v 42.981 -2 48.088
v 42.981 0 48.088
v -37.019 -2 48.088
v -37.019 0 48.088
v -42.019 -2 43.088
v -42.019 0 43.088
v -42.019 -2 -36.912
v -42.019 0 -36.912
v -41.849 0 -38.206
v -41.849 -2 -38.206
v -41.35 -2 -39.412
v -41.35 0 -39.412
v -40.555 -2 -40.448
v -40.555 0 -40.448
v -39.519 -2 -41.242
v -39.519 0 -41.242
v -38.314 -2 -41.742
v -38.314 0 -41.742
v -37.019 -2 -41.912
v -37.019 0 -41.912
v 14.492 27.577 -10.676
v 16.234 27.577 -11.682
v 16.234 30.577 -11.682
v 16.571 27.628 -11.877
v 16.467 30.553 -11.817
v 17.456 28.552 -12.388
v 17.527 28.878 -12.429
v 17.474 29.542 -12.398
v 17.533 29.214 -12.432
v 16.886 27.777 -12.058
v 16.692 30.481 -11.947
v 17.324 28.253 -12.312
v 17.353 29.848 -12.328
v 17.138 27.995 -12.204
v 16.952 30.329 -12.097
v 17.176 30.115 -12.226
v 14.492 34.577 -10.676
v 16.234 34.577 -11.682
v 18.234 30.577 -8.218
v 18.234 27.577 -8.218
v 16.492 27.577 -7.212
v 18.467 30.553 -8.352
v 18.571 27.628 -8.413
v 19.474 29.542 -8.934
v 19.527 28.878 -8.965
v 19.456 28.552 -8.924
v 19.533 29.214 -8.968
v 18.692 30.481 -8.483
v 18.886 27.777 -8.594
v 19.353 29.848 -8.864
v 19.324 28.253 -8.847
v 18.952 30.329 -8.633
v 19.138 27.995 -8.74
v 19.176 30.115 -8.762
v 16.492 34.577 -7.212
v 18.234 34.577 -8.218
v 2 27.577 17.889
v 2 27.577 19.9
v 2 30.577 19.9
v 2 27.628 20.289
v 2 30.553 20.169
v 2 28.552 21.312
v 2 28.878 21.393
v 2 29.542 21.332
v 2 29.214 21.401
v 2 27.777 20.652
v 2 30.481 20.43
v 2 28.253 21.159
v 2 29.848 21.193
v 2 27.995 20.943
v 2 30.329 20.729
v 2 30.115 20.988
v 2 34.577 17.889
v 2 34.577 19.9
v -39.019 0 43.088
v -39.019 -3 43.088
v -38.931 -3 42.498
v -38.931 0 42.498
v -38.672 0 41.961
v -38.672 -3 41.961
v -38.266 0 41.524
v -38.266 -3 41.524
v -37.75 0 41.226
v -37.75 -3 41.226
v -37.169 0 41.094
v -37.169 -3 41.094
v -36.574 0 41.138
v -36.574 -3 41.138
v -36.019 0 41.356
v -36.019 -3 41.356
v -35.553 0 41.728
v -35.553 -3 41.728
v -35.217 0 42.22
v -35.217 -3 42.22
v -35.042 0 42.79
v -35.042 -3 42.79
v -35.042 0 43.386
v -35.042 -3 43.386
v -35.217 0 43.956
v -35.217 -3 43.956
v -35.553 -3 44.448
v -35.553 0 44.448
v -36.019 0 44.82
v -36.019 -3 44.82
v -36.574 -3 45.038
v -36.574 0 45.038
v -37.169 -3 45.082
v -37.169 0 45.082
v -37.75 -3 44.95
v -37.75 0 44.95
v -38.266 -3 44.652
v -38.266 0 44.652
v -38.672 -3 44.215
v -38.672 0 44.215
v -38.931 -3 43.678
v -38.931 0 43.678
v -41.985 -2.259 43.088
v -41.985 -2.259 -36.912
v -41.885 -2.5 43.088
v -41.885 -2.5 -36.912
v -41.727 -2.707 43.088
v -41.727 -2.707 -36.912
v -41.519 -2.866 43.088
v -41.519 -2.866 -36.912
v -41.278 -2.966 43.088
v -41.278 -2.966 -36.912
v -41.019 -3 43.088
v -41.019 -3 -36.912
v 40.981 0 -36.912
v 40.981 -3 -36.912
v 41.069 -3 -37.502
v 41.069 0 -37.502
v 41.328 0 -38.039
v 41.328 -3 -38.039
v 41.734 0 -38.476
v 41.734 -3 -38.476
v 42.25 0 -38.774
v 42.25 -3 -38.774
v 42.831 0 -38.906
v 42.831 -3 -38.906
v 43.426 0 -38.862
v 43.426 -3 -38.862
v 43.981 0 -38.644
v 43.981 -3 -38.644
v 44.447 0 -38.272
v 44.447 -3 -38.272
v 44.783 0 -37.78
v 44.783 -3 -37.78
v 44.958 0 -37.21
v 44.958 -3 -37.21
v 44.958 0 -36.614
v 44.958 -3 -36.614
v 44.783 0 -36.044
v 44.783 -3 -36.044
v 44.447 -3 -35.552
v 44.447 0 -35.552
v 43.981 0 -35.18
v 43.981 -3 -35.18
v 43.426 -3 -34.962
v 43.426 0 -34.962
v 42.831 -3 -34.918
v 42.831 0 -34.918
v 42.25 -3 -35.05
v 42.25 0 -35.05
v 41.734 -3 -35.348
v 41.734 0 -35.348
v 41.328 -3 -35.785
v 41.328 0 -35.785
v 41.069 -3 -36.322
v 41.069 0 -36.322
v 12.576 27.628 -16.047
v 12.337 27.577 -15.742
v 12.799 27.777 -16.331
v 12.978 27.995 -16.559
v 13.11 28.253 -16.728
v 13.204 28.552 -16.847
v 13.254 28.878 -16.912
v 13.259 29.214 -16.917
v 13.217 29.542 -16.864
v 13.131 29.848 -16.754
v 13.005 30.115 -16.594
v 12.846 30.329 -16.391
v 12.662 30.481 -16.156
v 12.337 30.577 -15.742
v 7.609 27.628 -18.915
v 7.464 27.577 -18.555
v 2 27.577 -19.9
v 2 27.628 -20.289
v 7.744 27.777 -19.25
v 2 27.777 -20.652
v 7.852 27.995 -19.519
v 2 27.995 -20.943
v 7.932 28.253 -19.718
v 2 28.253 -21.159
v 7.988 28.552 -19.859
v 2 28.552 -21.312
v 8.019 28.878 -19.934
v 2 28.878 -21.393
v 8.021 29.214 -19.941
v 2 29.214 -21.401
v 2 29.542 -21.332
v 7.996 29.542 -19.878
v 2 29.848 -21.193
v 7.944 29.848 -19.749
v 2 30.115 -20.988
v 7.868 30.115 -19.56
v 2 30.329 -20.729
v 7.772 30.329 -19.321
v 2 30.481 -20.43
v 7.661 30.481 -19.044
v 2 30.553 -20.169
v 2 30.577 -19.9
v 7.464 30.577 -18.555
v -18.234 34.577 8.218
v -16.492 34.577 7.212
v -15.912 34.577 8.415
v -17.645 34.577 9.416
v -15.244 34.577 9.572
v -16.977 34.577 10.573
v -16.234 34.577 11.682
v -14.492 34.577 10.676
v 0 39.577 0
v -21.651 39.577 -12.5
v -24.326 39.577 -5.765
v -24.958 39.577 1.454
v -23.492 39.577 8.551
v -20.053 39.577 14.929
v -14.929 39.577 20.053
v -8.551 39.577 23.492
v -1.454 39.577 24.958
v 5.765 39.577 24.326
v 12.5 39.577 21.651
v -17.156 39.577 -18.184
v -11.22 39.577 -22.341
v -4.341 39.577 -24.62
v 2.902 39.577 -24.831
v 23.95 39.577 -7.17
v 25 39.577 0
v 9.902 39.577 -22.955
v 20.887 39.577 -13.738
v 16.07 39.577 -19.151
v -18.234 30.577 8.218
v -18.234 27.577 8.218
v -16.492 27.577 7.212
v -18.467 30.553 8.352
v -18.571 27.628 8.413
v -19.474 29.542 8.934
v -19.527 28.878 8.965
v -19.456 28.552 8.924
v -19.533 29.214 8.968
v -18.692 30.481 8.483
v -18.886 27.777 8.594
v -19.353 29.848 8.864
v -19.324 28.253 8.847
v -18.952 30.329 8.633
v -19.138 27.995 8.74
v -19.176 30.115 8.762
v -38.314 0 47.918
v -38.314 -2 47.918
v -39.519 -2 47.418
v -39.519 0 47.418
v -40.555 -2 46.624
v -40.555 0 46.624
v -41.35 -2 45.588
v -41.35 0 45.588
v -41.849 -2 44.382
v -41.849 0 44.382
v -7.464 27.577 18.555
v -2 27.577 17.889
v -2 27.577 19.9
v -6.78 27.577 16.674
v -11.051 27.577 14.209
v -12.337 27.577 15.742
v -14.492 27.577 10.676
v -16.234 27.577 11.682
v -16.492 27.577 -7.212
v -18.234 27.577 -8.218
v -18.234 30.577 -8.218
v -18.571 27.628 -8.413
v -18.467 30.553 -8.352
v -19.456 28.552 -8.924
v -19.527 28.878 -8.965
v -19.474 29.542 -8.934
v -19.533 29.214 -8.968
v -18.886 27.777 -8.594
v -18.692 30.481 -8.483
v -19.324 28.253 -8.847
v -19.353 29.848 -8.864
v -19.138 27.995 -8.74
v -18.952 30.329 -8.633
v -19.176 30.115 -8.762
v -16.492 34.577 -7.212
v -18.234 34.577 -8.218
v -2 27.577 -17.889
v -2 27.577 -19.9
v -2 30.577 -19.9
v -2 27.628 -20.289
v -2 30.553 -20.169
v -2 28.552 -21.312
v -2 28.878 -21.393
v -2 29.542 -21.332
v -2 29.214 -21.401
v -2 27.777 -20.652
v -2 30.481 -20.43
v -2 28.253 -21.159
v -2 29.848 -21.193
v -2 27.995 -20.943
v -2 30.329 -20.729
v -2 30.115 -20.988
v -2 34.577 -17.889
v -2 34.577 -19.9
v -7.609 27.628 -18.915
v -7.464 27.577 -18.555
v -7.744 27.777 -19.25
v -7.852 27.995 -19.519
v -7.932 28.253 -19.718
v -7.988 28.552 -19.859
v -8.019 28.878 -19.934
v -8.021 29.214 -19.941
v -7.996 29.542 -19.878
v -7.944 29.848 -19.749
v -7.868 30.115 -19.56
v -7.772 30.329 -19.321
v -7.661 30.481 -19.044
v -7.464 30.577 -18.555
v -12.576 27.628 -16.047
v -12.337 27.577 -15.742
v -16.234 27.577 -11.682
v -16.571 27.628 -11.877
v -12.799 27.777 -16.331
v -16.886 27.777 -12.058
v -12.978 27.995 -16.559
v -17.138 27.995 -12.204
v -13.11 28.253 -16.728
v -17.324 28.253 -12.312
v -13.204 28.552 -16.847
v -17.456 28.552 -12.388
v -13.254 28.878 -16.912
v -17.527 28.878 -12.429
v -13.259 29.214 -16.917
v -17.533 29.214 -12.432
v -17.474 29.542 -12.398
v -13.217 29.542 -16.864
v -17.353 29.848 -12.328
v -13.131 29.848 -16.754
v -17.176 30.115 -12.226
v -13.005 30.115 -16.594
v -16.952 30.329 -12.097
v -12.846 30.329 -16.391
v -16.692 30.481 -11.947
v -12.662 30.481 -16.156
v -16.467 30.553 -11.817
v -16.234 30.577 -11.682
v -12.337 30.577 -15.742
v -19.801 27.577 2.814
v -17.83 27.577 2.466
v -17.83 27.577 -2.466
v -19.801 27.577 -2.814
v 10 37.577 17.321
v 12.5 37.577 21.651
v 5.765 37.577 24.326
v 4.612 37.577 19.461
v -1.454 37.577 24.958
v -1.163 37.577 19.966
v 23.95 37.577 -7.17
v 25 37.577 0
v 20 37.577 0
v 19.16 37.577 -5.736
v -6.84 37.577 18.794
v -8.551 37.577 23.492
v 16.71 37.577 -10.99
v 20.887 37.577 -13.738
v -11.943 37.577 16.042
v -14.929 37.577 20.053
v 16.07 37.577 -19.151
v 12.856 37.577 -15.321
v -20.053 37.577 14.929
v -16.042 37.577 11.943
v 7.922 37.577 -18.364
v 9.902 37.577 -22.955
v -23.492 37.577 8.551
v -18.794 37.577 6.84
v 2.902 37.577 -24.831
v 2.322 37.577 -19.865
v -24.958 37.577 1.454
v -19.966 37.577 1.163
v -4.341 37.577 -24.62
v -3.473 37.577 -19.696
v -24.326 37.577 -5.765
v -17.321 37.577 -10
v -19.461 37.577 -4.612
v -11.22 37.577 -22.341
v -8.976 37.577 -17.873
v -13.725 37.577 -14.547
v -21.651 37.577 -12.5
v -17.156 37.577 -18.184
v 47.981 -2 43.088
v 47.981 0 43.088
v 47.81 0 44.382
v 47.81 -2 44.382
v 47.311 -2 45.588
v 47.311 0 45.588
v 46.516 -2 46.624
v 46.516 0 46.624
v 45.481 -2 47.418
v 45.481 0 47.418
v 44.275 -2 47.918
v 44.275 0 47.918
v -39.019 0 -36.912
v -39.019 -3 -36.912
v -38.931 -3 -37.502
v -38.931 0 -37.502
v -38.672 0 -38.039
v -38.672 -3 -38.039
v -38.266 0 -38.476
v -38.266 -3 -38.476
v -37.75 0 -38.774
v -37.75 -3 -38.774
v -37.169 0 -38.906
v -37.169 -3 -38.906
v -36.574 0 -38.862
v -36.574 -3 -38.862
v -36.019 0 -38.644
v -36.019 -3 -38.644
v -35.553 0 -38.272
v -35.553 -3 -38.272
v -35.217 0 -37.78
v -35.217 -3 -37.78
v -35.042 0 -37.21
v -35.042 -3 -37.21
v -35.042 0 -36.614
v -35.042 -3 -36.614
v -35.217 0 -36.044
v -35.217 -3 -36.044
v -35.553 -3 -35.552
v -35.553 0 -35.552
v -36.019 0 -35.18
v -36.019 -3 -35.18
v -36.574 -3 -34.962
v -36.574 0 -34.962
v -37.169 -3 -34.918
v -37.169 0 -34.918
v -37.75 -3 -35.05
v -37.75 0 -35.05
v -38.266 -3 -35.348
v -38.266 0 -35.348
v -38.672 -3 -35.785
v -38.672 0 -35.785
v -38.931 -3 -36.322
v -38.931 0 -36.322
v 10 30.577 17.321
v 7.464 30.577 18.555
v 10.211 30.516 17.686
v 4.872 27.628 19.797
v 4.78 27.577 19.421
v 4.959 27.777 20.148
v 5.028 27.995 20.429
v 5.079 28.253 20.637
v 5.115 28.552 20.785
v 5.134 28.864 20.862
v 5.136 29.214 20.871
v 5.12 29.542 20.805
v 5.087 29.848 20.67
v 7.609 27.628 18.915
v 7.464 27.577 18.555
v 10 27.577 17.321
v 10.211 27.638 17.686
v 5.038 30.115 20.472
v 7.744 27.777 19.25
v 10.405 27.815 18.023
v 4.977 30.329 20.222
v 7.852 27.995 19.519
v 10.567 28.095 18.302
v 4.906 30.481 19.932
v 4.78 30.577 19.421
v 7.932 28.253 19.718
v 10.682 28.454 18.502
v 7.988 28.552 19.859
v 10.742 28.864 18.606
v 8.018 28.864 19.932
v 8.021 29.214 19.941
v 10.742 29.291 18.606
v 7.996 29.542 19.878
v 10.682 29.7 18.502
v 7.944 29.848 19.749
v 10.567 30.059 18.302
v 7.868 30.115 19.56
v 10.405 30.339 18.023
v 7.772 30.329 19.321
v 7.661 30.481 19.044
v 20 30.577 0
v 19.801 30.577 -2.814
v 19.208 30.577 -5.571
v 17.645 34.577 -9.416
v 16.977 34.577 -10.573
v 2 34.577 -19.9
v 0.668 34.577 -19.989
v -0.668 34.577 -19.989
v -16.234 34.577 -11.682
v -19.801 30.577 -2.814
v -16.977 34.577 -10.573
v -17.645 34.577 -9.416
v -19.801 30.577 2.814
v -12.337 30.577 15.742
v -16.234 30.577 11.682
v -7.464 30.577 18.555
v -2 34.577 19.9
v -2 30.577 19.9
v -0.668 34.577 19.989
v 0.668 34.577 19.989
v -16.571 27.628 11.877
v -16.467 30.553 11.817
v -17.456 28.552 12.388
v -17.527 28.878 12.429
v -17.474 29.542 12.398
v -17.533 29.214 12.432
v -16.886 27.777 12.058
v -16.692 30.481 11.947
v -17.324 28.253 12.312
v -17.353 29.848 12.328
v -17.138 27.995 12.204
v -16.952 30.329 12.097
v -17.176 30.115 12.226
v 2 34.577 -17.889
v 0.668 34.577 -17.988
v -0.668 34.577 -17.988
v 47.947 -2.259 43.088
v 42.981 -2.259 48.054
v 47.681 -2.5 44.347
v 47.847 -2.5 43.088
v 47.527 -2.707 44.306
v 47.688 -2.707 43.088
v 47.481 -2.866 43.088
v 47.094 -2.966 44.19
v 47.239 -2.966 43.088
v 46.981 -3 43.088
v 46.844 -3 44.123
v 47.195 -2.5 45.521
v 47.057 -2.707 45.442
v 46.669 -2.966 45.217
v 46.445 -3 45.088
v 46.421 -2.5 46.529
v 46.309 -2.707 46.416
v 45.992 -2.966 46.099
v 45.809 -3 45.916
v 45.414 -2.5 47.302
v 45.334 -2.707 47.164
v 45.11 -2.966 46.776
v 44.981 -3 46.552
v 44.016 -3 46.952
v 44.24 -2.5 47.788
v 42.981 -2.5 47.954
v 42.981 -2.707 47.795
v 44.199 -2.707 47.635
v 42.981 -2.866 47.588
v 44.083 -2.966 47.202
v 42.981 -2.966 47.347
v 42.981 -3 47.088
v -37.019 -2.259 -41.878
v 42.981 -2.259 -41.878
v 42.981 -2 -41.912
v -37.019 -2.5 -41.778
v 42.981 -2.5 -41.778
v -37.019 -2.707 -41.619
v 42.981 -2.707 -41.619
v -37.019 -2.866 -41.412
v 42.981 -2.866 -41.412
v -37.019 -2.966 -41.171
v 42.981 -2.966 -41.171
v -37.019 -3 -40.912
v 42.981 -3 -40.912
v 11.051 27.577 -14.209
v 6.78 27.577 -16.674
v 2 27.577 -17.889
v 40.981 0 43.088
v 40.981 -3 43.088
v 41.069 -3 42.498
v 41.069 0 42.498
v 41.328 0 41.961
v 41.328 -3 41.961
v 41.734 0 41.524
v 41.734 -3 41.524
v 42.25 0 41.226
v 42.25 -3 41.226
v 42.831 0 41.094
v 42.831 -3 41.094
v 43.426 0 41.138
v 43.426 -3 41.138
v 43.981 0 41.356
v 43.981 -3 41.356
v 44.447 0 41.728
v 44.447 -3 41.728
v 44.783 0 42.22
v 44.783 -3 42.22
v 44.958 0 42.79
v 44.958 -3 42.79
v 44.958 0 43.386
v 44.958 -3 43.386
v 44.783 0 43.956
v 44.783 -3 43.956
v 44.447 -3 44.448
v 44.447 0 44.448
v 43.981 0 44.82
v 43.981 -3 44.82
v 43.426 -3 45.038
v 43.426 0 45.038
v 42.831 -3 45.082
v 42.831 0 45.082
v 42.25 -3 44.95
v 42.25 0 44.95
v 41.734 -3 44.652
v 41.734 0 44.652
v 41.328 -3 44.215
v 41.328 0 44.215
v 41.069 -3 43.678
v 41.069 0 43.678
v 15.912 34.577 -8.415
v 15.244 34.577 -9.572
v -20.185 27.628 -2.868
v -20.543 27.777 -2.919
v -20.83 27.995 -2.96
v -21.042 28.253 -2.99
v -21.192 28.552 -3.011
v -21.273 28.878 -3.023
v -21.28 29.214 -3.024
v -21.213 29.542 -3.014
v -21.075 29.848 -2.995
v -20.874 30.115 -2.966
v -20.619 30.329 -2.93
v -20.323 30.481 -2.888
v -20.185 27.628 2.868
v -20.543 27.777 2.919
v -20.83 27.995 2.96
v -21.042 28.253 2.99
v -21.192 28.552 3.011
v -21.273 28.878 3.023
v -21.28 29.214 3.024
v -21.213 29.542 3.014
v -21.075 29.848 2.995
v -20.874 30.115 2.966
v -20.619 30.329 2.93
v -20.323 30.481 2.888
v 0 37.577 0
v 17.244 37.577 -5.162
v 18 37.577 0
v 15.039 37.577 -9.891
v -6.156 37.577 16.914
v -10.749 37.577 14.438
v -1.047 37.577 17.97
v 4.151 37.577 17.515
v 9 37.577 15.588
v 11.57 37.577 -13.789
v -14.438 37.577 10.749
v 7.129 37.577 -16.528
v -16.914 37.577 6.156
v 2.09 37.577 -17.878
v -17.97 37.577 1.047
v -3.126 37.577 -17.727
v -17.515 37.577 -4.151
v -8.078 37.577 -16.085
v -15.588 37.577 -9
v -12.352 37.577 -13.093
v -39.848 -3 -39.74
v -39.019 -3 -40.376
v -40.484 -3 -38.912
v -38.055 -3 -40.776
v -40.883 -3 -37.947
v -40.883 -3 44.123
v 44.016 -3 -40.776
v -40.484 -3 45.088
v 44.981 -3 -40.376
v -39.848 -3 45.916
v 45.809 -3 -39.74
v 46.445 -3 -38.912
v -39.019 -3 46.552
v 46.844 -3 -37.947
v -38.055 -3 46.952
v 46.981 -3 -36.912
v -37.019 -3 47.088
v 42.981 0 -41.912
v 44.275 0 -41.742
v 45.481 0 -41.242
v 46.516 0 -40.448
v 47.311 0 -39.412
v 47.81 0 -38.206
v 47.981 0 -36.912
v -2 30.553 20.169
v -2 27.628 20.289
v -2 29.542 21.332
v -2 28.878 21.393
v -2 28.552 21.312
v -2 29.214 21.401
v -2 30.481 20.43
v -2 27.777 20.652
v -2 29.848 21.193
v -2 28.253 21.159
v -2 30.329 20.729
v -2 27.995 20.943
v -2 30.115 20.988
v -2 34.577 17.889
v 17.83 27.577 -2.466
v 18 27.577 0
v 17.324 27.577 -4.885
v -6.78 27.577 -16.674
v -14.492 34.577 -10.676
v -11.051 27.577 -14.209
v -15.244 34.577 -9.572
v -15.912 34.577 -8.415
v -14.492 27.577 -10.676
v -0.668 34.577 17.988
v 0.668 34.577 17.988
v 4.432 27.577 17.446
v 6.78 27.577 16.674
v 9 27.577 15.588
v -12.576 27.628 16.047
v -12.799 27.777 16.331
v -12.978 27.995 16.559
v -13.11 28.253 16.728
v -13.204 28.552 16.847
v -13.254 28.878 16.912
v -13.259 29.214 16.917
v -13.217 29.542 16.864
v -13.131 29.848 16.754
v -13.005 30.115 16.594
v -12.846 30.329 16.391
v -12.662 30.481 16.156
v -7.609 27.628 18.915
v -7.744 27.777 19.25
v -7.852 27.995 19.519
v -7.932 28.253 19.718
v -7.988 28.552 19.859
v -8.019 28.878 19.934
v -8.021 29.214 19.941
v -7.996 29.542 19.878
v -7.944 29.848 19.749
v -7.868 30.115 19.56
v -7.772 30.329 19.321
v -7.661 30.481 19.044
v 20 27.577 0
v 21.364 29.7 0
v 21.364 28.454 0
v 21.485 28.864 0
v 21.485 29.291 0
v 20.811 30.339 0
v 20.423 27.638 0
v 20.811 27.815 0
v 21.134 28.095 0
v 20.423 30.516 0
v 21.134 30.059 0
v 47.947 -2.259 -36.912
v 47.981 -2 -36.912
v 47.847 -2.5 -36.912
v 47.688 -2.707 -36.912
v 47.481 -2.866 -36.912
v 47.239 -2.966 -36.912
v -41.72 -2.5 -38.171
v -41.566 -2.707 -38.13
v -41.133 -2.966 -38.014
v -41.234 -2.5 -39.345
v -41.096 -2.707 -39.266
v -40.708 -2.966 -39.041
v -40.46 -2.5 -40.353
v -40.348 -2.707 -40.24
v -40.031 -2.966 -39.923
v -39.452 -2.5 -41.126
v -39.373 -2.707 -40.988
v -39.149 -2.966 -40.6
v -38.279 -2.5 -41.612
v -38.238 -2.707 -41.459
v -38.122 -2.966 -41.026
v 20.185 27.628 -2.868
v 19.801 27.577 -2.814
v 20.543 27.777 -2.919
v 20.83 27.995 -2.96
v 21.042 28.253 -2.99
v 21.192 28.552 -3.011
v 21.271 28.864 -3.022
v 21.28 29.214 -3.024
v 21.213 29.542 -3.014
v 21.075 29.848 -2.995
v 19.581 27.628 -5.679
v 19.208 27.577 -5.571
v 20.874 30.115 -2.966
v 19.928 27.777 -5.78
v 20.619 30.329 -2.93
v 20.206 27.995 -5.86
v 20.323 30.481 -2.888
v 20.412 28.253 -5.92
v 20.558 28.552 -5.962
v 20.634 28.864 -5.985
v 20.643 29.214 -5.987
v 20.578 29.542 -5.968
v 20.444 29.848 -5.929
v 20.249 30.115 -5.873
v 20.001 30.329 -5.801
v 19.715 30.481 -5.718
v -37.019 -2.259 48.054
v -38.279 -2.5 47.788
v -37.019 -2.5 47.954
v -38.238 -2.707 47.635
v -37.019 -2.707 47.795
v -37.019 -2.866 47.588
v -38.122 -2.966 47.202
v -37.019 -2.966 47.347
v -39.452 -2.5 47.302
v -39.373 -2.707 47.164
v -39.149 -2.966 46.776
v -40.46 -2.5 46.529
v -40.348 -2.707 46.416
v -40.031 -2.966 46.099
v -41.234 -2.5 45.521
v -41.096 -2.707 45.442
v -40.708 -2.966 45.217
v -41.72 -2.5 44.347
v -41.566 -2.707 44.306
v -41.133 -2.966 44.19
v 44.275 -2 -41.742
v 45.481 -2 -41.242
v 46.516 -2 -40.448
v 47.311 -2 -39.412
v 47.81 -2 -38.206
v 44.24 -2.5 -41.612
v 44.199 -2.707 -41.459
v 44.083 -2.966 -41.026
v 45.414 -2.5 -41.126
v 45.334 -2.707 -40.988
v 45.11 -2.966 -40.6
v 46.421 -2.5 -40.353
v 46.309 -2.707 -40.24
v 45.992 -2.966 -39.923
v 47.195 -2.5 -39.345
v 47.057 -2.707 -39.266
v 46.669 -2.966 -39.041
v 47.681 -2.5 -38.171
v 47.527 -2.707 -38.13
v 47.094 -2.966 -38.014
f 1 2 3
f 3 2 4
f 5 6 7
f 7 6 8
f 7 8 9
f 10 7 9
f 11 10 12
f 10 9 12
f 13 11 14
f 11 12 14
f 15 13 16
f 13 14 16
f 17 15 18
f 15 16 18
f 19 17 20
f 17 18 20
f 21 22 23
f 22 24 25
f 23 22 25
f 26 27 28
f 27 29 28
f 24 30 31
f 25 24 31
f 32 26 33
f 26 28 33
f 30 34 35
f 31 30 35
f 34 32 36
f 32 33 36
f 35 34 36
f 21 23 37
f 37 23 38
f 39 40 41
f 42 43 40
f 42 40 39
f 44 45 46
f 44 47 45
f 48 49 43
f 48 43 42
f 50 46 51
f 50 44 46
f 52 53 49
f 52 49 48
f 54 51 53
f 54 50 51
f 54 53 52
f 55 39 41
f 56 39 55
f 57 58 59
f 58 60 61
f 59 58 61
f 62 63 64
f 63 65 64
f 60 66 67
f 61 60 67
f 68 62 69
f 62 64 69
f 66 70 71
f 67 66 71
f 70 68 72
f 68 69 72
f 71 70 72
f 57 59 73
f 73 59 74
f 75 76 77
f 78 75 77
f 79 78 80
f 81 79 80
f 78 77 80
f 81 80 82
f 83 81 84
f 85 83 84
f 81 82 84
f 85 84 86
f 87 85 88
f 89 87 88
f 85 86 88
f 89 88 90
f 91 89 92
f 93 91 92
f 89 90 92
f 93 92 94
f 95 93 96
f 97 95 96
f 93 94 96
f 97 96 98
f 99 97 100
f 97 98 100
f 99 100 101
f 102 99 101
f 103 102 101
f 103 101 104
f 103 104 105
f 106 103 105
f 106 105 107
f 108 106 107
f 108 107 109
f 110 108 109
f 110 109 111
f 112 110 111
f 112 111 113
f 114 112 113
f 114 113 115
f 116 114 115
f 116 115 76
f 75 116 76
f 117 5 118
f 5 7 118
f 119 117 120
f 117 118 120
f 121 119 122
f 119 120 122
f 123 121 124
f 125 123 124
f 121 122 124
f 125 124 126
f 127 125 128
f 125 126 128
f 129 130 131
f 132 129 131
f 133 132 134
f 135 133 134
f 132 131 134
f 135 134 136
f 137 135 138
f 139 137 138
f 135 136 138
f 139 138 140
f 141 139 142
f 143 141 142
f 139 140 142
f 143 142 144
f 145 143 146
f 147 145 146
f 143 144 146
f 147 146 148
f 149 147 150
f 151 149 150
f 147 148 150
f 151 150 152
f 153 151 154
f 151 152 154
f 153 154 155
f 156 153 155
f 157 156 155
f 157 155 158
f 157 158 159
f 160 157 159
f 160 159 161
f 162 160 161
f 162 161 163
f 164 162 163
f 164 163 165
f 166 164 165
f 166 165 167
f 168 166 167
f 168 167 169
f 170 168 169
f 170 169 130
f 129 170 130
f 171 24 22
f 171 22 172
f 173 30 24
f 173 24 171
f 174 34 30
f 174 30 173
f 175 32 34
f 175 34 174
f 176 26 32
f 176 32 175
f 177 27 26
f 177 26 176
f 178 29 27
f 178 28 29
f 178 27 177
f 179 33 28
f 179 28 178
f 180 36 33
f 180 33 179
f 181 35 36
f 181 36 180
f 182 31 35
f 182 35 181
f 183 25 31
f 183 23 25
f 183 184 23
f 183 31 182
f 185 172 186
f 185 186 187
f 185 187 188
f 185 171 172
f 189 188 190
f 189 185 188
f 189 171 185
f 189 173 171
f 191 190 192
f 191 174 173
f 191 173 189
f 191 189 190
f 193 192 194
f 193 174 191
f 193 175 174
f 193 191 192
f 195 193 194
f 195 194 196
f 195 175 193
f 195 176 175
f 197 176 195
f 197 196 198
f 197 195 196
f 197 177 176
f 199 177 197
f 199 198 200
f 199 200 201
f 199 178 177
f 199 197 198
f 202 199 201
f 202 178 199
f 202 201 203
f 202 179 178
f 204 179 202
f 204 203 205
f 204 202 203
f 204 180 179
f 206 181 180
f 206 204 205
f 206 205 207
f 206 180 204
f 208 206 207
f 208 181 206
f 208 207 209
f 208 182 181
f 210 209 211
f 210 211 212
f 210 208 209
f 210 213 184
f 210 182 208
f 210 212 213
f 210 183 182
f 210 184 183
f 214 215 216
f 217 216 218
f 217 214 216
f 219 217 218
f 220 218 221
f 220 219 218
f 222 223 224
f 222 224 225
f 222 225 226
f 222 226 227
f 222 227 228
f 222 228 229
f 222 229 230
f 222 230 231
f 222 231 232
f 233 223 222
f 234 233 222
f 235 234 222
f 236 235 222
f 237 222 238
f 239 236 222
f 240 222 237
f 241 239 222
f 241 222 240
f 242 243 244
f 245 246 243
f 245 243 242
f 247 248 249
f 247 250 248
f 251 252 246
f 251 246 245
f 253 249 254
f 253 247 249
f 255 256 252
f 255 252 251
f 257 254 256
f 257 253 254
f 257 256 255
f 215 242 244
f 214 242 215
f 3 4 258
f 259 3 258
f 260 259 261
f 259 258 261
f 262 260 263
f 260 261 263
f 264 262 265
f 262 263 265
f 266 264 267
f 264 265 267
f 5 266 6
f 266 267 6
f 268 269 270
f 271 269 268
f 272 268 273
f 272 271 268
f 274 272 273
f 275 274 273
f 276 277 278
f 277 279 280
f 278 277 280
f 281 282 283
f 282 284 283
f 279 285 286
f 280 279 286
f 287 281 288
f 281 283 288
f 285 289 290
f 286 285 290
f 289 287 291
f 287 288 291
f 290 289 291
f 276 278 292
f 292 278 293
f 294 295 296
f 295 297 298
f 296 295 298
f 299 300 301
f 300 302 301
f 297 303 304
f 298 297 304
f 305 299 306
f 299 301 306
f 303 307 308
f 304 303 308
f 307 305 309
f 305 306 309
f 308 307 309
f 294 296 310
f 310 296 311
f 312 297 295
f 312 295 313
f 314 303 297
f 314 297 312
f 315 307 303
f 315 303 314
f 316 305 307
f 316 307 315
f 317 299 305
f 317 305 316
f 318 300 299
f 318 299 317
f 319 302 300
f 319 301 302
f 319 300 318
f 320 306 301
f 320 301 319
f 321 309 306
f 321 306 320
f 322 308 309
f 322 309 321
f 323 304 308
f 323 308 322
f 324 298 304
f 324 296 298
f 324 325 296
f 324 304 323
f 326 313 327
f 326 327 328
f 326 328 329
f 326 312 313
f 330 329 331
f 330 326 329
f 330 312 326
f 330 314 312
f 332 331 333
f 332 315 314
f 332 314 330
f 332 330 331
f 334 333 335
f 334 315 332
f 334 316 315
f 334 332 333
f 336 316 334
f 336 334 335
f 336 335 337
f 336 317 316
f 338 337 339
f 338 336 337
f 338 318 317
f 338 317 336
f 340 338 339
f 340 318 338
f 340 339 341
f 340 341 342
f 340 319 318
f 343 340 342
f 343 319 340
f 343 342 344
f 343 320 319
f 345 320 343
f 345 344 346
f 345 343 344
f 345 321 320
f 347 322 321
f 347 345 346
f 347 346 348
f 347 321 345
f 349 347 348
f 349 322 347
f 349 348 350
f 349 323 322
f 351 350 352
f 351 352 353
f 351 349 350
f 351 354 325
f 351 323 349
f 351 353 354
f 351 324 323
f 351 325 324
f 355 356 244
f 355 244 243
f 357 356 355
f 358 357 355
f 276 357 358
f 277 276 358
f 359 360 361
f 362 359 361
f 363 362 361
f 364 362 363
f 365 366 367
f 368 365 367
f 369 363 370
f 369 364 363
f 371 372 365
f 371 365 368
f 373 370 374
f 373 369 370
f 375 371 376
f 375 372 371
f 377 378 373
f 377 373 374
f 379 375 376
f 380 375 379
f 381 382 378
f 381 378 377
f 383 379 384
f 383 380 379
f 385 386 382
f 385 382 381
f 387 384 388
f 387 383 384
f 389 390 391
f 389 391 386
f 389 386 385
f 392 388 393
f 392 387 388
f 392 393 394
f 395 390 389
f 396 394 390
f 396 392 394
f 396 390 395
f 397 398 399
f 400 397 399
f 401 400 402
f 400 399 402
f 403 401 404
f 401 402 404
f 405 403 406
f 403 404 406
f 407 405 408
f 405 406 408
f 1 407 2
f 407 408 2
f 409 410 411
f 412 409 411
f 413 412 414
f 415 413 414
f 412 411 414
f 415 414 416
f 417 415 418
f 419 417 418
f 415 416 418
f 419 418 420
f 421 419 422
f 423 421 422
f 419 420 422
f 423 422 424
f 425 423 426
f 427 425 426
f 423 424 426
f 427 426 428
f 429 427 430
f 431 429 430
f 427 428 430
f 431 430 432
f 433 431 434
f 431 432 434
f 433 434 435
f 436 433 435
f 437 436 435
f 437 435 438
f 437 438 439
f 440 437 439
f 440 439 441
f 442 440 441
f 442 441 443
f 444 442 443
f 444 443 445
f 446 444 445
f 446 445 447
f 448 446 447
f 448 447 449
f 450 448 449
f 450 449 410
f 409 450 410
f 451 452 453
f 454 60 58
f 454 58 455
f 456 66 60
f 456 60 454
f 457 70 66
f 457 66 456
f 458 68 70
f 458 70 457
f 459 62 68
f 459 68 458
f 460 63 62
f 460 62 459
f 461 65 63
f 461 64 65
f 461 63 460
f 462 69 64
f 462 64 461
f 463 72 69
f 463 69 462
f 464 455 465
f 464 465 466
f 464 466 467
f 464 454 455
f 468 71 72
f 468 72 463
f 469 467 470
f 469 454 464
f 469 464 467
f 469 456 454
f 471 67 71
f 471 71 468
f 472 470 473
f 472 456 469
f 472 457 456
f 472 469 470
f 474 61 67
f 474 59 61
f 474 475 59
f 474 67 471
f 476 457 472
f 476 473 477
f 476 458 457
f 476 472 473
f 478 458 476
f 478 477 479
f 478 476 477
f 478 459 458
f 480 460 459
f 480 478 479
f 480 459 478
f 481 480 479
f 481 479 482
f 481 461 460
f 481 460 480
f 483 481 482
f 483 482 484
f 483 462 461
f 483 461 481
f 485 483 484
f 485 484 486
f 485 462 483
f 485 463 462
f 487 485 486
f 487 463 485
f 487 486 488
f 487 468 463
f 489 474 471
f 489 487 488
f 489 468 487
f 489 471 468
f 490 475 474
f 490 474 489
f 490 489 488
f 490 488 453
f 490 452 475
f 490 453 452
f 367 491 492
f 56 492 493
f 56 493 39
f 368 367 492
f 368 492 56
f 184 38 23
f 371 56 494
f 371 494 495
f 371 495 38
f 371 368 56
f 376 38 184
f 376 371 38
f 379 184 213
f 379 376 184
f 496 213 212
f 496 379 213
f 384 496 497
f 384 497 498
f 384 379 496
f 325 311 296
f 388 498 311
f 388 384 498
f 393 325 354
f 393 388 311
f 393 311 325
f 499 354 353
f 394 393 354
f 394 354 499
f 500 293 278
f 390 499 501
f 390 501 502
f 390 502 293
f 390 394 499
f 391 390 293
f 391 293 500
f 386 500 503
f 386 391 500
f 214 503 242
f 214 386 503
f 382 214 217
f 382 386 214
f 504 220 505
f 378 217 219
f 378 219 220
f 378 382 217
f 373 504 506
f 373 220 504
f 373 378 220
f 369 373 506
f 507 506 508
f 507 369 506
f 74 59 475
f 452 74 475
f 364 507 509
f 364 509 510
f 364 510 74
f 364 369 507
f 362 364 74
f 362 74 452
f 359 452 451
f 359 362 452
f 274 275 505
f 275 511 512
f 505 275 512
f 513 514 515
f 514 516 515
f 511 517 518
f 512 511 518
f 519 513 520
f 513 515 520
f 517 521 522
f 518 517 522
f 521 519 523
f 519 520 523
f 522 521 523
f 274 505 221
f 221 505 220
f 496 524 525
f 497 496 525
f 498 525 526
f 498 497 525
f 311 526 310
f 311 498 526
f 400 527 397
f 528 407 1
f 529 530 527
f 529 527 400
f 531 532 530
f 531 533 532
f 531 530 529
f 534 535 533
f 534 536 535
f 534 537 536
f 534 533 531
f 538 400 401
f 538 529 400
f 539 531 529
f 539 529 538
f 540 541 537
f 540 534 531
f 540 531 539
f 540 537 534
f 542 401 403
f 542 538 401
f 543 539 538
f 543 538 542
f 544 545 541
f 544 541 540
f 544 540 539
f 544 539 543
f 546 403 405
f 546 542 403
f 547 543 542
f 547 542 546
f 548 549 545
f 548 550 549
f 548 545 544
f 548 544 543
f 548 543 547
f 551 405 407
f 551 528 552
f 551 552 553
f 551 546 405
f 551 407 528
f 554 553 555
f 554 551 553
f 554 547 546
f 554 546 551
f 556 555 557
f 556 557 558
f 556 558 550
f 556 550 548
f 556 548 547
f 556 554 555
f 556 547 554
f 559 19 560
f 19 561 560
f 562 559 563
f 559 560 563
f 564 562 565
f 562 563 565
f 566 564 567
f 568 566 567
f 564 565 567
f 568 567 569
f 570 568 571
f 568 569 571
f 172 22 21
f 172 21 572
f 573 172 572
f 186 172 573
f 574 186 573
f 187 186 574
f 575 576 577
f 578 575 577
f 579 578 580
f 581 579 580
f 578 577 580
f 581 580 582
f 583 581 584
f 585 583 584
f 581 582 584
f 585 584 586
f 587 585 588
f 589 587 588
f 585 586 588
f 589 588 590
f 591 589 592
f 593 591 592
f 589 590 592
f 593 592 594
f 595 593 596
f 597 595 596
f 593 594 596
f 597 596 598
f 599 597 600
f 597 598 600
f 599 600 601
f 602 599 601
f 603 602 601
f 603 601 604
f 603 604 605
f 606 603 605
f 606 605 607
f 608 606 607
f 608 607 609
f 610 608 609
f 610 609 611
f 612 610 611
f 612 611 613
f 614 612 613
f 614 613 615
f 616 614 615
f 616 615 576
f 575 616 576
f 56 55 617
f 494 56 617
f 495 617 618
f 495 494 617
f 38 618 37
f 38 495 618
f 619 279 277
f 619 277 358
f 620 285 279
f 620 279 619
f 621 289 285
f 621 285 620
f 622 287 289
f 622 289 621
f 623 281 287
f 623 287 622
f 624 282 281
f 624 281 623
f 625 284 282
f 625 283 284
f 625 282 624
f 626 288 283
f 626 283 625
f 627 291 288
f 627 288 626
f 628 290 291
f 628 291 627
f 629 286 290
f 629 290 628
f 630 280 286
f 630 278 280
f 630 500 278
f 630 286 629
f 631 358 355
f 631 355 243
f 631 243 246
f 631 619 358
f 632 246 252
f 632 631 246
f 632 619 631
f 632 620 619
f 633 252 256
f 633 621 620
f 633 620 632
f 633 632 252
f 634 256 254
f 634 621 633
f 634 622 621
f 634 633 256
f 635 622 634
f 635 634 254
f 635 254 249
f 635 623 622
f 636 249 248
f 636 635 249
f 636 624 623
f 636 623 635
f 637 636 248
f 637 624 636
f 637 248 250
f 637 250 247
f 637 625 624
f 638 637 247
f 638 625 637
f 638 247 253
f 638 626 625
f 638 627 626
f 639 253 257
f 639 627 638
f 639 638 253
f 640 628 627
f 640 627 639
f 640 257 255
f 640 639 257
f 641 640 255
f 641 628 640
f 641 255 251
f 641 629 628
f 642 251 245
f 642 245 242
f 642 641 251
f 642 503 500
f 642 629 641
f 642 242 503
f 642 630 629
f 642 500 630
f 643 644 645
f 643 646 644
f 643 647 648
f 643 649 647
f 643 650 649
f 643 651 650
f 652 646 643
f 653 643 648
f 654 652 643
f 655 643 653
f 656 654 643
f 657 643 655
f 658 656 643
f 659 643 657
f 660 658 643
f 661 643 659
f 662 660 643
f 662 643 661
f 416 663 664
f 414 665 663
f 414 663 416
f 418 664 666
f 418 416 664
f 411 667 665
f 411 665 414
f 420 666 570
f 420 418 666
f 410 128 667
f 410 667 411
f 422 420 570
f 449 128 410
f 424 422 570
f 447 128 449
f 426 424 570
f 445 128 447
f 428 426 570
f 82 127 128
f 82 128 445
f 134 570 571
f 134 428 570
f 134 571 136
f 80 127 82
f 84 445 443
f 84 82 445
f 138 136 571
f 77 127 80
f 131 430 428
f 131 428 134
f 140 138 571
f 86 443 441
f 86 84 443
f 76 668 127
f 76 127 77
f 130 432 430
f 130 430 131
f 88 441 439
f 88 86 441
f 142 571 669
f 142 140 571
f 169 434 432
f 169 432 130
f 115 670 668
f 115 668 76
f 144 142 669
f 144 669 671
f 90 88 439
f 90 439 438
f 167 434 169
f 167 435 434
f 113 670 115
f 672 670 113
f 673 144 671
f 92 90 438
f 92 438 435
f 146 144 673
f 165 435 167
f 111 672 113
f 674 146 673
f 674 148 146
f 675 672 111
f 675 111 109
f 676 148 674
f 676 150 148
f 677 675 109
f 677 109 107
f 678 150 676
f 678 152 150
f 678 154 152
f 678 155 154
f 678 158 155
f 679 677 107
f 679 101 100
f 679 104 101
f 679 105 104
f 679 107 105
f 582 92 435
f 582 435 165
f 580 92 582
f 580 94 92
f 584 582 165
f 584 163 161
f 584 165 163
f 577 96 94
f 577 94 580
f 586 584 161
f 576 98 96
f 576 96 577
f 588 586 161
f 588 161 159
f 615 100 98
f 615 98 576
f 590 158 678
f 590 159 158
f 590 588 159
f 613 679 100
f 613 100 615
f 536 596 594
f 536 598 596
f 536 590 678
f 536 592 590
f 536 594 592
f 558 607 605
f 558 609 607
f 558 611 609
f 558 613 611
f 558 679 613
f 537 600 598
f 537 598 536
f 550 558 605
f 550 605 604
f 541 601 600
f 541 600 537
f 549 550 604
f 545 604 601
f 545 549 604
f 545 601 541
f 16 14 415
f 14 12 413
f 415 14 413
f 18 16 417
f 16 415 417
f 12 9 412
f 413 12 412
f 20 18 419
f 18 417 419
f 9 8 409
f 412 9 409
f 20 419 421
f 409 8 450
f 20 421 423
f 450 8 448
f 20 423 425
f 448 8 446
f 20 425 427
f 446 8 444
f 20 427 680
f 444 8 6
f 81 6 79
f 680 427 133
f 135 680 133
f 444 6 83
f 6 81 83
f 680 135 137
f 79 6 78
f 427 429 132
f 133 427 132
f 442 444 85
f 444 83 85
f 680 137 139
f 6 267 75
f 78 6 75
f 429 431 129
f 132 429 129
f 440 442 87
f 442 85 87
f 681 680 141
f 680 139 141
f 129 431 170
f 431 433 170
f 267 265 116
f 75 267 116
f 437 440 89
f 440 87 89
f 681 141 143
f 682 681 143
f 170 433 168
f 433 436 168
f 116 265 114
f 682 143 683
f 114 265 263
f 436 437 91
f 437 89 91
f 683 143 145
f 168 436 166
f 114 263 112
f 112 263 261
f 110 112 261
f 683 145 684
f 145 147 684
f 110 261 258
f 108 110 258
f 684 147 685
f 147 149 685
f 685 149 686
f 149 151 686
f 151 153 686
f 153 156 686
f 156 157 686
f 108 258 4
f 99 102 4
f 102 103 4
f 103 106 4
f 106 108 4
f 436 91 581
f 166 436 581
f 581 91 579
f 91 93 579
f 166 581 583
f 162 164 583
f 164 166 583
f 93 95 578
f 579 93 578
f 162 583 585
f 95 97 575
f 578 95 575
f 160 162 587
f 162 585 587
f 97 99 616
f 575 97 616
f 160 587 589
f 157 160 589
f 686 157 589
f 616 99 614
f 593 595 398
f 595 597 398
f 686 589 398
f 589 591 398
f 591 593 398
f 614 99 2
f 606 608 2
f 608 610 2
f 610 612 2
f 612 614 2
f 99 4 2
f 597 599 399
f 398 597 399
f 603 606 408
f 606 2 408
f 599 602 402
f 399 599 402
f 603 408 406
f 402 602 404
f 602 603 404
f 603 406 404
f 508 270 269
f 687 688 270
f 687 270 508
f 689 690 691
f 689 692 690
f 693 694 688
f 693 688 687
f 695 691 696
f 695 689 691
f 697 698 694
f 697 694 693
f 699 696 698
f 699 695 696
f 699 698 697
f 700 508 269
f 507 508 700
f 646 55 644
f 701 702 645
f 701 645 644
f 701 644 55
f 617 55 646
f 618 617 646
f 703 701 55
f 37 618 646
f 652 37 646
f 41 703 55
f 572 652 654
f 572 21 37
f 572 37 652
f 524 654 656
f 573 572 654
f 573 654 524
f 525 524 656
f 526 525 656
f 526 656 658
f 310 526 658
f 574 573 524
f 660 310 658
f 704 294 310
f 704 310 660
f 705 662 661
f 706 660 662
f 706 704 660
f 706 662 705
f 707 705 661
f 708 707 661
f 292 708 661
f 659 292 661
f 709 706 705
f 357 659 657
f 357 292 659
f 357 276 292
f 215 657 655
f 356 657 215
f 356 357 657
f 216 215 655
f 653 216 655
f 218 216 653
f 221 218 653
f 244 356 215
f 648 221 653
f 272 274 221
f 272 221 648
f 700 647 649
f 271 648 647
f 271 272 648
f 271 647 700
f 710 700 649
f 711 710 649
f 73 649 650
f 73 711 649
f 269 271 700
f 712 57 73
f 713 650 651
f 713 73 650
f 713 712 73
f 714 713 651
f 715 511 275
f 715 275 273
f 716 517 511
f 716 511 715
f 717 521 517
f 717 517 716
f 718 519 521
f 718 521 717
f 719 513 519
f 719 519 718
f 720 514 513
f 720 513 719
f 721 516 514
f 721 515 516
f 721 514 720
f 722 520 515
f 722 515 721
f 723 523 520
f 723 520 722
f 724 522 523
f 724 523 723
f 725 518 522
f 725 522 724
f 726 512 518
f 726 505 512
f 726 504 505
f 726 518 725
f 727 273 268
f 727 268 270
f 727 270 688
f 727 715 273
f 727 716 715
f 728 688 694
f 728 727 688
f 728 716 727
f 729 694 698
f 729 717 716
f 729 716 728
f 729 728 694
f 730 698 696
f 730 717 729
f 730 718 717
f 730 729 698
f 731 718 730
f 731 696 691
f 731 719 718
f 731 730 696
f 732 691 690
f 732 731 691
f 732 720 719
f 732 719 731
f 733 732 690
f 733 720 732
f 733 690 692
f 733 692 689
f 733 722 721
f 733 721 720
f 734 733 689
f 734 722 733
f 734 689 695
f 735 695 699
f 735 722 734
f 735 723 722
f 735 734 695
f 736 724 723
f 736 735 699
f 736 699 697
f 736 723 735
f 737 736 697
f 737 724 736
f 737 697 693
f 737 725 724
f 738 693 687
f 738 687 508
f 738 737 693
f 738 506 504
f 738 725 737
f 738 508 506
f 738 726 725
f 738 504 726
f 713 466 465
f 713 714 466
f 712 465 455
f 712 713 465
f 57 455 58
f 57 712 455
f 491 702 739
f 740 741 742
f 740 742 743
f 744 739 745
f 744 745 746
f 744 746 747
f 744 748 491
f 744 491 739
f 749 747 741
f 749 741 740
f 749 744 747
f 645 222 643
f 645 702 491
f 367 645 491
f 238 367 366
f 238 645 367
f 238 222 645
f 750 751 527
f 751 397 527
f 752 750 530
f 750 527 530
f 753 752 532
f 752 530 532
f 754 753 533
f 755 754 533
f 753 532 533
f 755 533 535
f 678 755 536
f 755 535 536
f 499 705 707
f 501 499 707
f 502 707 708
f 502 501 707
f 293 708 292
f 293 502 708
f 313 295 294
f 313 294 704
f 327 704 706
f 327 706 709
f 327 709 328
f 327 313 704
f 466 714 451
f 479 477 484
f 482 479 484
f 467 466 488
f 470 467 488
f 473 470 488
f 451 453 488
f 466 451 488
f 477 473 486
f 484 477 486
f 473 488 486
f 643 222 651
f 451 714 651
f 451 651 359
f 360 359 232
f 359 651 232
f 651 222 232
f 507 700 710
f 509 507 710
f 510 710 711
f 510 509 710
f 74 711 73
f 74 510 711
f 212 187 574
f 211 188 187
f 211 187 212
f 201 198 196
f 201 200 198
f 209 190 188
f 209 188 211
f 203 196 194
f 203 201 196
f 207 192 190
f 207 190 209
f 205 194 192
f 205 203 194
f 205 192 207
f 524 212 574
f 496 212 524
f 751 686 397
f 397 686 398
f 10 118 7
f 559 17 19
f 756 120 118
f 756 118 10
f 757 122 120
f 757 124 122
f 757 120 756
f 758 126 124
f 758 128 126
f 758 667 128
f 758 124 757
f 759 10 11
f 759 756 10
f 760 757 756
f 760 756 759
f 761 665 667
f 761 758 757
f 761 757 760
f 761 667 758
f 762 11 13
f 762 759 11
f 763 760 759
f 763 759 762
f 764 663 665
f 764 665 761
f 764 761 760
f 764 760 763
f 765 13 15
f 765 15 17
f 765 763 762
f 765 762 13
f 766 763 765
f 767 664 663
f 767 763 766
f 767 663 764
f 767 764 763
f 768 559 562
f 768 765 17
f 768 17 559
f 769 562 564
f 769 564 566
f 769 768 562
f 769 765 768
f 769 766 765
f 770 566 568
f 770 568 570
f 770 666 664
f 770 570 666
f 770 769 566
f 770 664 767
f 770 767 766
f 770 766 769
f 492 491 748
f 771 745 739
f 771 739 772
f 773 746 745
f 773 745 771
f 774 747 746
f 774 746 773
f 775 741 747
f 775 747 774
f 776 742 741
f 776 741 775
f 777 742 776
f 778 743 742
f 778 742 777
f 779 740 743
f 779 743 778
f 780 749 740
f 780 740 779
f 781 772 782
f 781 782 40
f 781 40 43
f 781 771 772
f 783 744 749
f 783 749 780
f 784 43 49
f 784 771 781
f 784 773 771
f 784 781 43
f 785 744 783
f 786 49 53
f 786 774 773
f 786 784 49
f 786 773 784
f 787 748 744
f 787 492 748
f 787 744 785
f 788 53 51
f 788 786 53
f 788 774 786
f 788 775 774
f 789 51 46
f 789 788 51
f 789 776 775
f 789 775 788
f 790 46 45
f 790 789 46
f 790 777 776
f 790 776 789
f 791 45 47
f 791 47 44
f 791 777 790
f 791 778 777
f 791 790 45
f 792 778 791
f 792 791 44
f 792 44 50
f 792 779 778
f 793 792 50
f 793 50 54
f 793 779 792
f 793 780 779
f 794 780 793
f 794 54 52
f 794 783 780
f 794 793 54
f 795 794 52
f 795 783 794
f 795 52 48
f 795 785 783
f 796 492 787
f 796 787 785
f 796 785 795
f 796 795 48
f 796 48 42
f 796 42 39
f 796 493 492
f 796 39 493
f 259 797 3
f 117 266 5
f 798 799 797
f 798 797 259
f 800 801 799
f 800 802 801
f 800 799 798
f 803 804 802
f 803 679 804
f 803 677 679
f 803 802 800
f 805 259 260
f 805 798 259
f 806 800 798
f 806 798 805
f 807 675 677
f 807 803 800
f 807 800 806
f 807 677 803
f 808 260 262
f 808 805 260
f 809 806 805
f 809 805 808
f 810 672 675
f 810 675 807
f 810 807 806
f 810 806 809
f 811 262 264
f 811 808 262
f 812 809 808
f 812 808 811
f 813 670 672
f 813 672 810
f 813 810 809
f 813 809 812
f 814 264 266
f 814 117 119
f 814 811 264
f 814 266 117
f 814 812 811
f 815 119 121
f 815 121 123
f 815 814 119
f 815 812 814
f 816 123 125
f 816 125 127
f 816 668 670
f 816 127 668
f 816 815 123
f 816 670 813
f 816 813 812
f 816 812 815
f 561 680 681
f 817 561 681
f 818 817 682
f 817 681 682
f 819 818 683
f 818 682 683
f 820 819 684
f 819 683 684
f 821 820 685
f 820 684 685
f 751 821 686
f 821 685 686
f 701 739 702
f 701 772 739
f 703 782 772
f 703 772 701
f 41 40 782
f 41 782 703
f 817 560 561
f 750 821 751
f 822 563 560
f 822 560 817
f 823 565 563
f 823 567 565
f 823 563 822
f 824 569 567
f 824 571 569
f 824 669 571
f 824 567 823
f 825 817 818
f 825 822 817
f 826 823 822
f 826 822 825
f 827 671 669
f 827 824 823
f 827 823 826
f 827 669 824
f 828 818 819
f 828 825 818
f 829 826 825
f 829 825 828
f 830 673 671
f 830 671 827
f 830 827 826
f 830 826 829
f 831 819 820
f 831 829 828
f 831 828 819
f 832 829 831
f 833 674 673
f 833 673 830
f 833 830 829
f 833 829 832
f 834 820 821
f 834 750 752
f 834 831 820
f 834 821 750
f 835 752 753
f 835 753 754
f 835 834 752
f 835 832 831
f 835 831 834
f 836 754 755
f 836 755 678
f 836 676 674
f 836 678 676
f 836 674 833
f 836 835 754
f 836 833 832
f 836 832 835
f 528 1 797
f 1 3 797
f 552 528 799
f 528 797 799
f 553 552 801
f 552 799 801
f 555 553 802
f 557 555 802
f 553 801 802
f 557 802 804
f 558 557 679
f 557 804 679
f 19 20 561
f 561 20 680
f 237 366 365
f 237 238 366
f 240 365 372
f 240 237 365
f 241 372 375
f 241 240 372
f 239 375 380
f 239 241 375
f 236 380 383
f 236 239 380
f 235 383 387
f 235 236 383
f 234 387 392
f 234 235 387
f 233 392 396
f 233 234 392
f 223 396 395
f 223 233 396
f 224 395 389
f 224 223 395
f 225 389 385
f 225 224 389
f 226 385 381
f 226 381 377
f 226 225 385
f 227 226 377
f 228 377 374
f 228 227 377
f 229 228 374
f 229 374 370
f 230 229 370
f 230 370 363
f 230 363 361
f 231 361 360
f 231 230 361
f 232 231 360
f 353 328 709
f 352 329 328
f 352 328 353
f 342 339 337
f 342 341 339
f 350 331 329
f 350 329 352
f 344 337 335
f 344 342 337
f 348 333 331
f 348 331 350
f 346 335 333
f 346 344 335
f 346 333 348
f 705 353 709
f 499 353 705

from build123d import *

# Parameters (mm, degrees)
F1_DEPTH = 3
F2_R     = 1
F3_D     = 4
F5_ANGLE = 300
F7_W     = 4
F7_H     = 7
F8_DEPTH = 10
F9_COUNT = 6


with BuildPart() as f1:
    # F0 (on Front) → F1 (new body)
    with BuildSketch(Plane.XZ):
        with BuildLine():
            Line((42.9805768281, 48.0879917694), (-37.0194231719, 48.0879917694))
            ThreePointArc((-37.0194231719, 48.0879917694), (-40.5549570778, 46.6235256753), (-42.0194231719, 43.0879917694))
            Line((-42.0194231719, 43.0879917694), (-42.0194231719, -36.9120082306))
            ThreePointArc((-42.0194231719, -36.9120082306), (-40.5549570778, -40.4475421365), (-37.0194231719, -41.9120082306))
            Line((-37.0194231719, -41.9120082306), (42.9805768281, -41.9120082306))
            ThreePointArc((42.9805768281, -41.9120082306), (46.5161107341, -40.4475421365), (47.9805768281, -36.9120082306))
            Line((47.9805768281, -36.9120082306), (47.9805768281, 43.0879917694))
            ThreePointArc((47.9805768281, 43.0879917694), (46.5161107341, 46.6235256753), (42.9805768281, 48.0879917694))
        make_face()
    extrude(amount=F1_DEPTH)

    # F2
    f2_edges = [f1.edges().sort_by_distance(p)[0] for p in [
        (2.980577, -3, 48.087992),
        (-40.554957, -3, 46.623526),
        (-42.019423, -3, 3.087992),
        (-40.554957, -3, -40.447542),
        (2.980577, -3, -41.912008),
        (46.516111, -3, -40.447542),
        (47.980577, -3, 3.087992),
        (46.516111, -3, 46.623526),
    ]]
    fillet(f2_edges, radius=F2_R)

    # F3 (through all)
    with Locations(Plane(origin=(0, 0, 0), x_dir=(1, 0, 0), z_dir=(0, 1, 0))):
        with Locations((42.9805768281, -43.0879917694), (42.9805768281, 36.9120082306), (-37.0194231719, 36.9120082306), (-37.0194231719, -43.0879917694)):
            Hole(F3_D / 2)


with BuildPart() as f5:
    # F4 (on Top) → F5 (revolve)
    with BuildSketch(Plane.XY):
        Polygon((25, 39.5770294305), (0, 39.5770294305), (0, 37.5770294305), (18, 37.5770294305), (18, 27.5770294305), (20, 27.5770294305), (20, 30.5770294305), (20, 37.5770294305), (25, 37.5770294305), align=None)
        with BuildLine():
            ThreePointArc((20, 27.5770294305), (21.5, 29.0770294305), (20, 30.5770294305))
            Line((20, 30.5770294305), (20, 27.5770294305))
        make_face()
    revolve(axis=Axis((0, 38.5770294305, 0), (0, 1, 0)), revolution_arc=F5_ANGLE)


with BuildPart() as f8:
    # F7 (on offset) → F8 (new body)
    with BuildSketch(Plane.XY.offset(25)):
        with Locations((0, 31.0770294305)):
            Rectangle(F7_W, F7_H)
    extrude(amount=-F8_DEPTH)


with BuildPart() as f9_1:
    # F9: instance of F8
    add(f8.part.rotate(Axis((0, 30.5770294305, 0), (0, 1, 0)), 1 * 360 / F9_COUNT))


with BuildPart() as f9_2:
    # F9: instance of F8
    add(f8.part.rotate(Axis((0, 30.5770294305, 0), (0, 1, 0)), 2 * 360 / F9_COUNT))


with BuildPart() as f9_3:
    # F9: instance of F8
    add(f8.part.rotate(Axis((0, 30.5770294305, 0), (0, 1, 0)), 3 * 360 / F9_COUNT))


with BuildPart() as f9_4:
    # F9: instance of F8
    add(f8.part.rotate(Axis((0, 30.5770294305, 0), (0, 1, 0)), 4 * 360 / F9_COUNT))


with BuildPart() as f9_5:
    # F9: instance of F8
    add(f8.part.rotate(Axis((0, 30.5770294305, 0), (0, 1, 0)), 5 * 360 / F9_COUNT))


with BuildPart() as f5_1:
    add(f5.part)

    # F10: cut F9_2, F9_1, F8, F9_5, F9_4, F9_3
    add(f9_2.part, mode=Mode.SUBTRACT)
    add(f9_1.part, mode=Mode.SUBTRACT)
    add(f8.part, mode=Mode.SUBTRACT)
    add(f9_5.part, mode=Mode.SUBTRACT)
    add(f9_4.part, mode=Mode.SUBTRACT)
    add(f9_3.part, mode=Mode.SUBTRACT)


solid = Compound([f1.part, f5_1.part])
